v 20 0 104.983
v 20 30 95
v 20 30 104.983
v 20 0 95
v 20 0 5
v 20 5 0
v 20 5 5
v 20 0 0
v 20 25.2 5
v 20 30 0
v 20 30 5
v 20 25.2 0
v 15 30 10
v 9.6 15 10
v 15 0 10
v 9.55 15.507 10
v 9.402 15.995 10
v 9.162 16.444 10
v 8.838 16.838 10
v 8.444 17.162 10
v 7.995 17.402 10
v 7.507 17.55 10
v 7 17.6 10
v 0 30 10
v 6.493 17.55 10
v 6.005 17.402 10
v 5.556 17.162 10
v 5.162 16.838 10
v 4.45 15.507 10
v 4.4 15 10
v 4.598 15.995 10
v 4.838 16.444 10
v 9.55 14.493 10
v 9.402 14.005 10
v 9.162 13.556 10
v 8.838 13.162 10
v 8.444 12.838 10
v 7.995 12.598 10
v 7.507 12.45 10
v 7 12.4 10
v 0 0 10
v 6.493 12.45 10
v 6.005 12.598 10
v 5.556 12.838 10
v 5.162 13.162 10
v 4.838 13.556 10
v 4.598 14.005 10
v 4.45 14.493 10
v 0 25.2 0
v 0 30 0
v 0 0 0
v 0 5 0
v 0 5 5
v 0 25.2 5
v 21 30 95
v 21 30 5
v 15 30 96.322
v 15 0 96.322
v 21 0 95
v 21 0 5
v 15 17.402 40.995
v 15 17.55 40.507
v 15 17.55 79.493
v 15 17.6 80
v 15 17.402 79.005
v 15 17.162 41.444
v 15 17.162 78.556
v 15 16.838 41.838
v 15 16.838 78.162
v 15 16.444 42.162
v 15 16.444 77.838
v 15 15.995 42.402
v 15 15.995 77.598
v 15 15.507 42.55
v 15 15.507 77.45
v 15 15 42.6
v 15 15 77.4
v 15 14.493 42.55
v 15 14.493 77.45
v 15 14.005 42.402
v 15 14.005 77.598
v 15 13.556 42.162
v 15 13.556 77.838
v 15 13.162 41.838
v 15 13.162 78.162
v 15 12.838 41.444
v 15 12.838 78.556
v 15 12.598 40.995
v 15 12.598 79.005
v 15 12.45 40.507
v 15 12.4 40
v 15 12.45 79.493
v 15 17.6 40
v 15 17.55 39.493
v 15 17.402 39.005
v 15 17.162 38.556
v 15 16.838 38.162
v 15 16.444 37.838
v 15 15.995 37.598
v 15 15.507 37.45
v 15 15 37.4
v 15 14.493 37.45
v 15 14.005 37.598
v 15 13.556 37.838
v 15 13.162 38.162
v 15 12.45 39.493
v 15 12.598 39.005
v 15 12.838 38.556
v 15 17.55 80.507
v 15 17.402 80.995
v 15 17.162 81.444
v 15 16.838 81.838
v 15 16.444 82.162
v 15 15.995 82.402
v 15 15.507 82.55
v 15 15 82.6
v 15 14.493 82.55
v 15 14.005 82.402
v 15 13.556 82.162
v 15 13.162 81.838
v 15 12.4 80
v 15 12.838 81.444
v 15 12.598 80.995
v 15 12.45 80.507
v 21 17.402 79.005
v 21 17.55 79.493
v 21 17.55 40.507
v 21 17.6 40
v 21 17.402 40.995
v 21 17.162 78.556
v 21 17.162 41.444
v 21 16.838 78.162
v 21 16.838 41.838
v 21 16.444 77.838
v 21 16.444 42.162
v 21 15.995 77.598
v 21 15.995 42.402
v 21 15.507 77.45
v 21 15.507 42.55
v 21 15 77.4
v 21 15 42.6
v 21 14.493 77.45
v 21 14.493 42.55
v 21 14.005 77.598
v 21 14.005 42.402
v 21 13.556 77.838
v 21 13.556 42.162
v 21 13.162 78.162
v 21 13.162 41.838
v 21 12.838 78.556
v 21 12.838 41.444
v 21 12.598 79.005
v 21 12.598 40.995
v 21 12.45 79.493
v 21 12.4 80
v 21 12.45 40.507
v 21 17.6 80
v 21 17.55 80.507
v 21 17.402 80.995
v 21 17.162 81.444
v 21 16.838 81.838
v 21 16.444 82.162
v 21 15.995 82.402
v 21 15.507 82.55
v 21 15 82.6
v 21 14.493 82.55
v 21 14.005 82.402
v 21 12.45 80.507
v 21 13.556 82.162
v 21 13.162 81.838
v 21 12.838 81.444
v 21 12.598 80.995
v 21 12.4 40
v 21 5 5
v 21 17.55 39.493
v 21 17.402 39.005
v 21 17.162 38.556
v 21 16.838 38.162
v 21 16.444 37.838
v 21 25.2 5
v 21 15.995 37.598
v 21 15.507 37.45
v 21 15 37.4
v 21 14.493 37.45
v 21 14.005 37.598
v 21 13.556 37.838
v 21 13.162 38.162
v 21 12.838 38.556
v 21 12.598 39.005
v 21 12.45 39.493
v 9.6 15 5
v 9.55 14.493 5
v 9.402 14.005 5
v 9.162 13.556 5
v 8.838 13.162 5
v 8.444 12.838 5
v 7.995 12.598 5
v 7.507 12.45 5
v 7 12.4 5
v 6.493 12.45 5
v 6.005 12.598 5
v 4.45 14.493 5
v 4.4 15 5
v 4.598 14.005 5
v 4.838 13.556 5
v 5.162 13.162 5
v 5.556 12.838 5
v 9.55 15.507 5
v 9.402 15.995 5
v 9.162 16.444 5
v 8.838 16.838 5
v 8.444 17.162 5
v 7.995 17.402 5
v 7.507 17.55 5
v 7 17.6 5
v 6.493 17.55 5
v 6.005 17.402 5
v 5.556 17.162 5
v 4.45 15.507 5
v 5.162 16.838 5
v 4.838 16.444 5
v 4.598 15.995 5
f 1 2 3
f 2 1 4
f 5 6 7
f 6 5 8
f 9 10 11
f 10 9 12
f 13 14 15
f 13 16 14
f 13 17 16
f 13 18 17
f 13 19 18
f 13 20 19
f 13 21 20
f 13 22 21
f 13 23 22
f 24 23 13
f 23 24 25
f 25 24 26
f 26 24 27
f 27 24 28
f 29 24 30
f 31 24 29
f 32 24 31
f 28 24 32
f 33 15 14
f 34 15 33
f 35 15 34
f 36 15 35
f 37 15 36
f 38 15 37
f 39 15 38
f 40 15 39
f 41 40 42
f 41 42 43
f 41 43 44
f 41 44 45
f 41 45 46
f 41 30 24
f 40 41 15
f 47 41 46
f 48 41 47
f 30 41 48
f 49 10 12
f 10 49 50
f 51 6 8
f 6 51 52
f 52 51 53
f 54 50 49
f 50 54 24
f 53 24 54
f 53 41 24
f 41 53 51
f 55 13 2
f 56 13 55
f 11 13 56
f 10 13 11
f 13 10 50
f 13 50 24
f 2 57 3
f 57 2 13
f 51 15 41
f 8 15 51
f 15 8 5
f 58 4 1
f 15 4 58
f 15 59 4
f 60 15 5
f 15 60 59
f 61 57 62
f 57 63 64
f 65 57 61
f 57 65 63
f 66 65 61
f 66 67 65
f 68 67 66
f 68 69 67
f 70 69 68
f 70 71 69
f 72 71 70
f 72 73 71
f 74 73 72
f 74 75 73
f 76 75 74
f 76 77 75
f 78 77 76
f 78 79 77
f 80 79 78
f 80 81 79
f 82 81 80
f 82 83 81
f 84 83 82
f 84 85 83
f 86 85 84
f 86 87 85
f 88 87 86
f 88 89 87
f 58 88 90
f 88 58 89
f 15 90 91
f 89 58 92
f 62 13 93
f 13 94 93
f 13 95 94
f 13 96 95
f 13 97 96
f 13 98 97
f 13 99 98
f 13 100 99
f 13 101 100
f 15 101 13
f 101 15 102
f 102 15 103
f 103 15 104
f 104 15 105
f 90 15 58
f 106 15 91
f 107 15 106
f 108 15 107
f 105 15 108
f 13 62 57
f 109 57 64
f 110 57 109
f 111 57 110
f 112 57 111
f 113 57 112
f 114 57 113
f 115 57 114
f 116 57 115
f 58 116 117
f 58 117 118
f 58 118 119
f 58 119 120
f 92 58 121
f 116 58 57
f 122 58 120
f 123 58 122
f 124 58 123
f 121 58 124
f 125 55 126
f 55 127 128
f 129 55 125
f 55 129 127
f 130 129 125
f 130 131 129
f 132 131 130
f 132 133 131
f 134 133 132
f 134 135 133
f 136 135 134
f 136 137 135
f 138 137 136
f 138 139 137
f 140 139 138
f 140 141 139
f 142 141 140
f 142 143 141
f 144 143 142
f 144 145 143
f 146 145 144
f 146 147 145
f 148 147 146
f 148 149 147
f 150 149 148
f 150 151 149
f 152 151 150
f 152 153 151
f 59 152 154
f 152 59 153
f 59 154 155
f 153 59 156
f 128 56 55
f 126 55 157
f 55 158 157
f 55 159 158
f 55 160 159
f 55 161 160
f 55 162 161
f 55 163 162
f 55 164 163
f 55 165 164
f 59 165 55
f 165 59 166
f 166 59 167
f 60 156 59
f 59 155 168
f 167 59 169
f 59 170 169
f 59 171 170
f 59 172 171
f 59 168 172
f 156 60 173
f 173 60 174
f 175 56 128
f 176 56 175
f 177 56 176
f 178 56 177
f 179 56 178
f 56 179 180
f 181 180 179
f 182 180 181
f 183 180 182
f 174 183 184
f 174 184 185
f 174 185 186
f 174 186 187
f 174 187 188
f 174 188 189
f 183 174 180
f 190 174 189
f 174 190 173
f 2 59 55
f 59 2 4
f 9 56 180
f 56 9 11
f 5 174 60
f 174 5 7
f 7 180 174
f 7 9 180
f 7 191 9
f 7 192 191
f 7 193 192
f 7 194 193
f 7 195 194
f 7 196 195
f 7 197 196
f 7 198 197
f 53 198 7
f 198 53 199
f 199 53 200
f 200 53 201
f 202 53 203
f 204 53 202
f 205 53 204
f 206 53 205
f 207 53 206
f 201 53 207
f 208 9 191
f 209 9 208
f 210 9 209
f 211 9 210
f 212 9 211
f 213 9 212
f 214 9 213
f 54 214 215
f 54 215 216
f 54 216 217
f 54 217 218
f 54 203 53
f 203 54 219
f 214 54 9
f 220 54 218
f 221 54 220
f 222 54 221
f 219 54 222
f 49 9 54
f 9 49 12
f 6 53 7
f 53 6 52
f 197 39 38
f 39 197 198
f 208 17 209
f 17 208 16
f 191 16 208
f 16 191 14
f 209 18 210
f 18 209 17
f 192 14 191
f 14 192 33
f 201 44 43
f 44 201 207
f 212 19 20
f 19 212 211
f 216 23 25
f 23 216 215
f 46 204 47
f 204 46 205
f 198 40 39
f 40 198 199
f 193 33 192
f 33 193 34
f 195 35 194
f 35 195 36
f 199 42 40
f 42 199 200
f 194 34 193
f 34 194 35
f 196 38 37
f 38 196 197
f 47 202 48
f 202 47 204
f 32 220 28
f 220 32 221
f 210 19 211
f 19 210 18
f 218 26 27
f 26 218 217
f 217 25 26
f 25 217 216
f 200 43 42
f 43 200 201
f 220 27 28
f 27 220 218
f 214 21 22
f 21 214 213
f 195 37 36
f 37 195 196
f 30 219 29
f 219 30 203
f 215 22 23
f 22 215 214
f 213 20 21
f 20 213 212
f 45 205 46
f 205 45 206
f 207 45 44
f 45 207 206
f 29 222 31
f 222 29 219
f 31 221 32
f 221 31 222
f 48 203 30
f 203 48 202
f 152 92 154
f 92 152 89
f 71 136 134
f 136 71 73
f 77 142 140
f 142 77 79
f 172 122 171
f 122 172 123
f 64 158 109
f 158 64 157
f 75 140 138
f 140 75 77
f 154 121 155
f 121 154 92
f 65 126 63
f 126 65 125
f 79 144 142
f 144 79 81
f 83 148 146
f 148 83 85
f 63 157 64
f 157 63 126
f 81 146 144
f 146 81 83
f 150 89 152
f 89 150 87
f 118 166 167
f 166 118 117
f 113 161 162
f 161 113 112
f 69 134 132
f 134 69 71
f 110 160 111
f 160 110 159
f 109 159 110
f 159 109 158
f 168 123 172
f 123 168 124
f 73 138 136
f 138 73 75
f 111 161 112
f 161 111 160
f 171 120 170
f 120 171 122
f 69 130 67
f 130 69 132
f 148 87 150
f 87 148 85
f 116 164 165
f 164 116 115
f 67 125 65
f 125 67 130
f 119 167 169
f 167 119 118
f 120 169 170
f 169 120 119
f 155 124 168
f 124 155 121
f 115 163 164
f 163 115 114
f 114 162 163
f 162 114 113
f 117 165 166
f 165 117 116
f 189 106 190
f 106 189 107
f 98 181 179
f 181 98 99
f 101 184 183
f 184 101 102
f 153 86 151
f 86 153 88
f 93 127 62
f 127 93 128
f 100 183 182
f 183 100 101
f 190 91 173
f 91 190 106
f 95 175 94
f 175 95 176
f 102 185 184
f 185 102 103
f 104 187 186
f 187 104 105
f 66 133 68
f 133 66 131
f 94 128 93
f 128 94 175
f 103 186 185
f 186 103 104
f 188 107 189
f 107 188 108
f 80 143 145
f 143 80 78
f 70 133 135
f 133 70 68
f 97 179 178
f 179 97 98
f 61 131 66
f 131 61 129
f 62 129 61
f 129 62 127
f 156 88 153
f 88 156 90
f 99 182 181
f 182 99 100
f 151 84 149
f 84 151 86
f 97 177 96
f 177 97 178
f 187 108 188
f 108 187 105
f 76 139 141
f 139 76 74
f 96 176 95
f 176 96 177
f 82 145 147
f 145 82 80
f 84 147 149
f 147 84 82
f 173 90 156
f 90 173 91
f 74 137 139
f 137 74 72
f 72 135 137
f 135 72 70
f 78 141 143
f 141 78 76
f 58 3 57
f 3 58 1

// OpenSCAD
$fn=32;
//difference(){
//    union(){
//        cube([20,30,28]);
//        translate([15,0,5])cube([5,30,100]);
//        translate([20,0,5])cube([1,30,90]);
//    };
//    translate([-2.5,5,-15])cube([30,20.2,20]);
//    translate([7,15,-1])cylinder(d=5.2,h=30);
//    translate([7,15,23])cylinder(d=9,h=100);
//    translate([0,15,80])rotate([0,90,0])cylinder(d=5.2,h=30);
////    translate([14,15,80])rotate([0,90,0])cylinder(d=9,h=5);
//    translate([0,15,40])rotate([0,90,0])cylinder(d=5.2,h=30);
////    translate([14,15,40])rotate([0,90,0])cylinder(d=9,h=5);
//};

difference(){
    union(){
        cube([20,30,10]);
        translate([15,0,5])cube([5,30,100]);
        translate([20,0,5])cube([1,30,90]);
    };
    translate([-2.5,5,-15])cube([30,20.2,20]);
    translate([7,15,-1])cylinder(d=5.2,h=30);
    translate([7,15,23])cylinder(d=9,h=100);
    translate([0,15,80])rotate([0,90,0])cylinder(d=5.2,h=30);
//    translate([14,15,80])rotate([0,90,0])cylinder(d=9,h=5);
    translate([0,15,40])rotate([0,90,0])cylinder(d=5.2,h=30);
//    translate([14,15,40])rotate([0,90,0])cylinder(d=9,h=5);
    translate([1.35,-1,92.68])rotate([0,30,0])cube([10,32,20]);
};
